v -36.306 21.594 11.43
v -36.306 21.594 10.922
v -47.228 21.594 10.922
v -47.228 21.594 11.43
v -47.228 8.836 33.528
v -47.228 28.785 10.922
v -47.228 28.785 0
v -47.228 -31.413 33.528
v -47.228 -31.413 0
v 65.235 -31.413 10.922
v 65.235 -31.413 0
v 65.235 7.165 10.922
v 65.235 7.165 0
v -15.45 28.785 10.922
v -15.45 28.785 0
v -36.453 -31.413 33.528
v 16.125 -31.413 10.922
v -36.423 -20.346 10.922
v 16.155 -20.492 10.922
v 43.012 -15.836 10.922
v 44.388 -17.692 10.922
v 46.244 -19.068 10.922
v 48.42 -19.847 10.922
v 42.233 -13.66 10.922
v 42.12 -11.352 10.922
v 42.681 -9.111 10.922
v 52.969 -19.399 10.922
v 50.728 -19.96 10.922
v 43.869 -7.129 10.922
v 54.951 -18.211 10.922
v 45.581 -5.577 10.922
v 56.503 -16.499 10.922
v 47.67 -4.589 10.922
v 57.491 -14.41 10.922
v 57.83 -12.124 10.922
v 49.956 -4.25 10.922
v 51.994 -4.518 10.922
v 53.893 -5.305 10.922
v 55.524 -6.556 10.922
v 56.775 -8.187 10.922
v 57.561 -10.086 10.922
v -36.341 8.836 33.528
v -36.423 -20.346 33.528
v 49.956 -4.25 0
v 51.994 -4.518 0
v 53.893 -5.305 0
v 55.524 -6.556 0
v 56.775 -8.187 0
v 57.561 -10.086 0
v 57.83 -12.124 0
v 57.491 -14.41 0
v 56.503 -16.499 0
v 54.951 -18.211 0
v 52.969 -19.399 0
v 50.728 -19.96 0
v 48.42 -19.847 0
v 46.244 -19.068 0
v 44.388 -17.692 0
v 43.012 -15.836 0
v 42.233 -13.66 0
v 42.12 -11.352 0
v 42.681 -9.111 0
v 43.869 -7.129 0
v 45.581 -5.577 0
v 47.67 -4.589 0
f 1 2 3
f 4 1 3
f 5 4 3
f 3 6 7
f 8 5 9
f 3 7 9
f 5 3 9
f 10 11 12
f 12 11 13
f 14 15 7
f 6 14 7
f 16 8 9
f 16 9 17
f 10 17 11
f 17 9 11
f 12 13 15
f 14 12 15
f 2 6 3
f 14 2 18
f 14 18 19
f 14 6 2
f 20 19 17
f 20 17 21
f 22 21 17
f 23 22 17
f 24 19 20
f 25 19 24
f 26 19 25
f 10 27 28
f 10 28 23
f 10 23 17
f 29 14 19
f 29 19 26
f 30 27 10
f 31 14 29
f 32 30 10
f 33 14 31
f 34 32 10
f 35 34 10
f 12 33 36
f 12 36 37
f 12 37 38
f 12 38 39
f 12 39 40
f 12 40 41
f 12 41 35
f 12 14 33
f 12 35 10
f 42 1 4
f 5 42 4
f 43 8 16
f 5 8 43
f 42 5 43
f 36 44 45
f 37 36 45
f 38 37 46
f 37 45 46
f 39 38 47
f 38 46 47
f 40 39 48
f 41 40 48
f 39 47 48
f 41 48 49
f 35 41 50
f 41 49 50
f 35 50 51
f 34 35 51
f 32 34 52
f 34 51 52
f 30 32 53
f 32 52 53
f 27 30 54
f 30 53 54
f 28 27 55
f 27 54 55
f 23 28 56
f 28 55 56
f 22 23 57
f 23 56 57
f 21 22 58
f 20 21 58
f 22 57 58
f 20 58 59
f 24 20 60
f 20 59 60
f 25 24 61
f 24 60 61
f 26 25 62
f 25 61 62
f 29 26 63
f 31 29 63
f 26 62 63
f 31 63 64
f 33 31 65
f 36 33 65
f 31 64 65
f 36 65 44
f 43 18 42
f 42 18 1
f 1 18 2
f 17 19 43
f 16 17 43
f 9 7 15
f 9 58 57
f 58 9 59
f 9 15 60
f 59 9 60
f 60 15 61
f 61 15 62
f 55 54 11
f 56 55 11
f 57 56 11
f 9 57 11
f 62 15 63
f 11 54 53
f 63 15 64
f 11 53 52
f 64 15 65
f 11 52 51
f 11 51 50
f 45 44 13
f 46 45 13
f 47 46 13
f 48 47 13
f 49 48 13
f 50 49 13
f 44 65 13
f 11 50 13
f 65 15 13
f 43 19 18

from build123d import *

# Parameters (mm, degrees)
F1_DEPTH   = 10.922
F2_DEPTH   = 33.528
F2_FACE1_W = 10.922
F2_FACE1_H = 22.606
F4_DEPTH   = 53.594
F5_SIZE2   = 12.7582862486
F5_SIZE    = 22.098


with BuildPart() as f1:
    # F0 (on Top) → F1 (new body)
    with BuildSketch(Plane.XY):
        Polygon((-15.4502129098, 28.784671135), (-47.2277541757, 28.784671135), (-47.2277541757, 21.5939618647), (-36.3057541757, 21.5939618647), (-36.4225804595, -20.345826518), (16.1552155546, -20.4922857339), (16.2997870902, -31.413328865), (65.234824773, -31.413328865), (65.234824773, 7.1651804467), align=None)
        with BuildLine():
            ThreePointArc((49.9557780186, -4.2500742092), (55.5235368137, -6.5563154141), (57.8297780186, -12.1240742092))
            ThreePointArc((57.8297780186, -12.1240742092), (44.3880192235, -17.6918330042), (49.9557780186, -4.2500742092))
        make_face(mode=Mode.SUBTRACT)
    extrude(amount=F1_DEPTH)

    # F0 (on Top) → F2 (join)
    with BuildSketch(Plane.XY):
        Polygon((-36.3057541757, 21.5939618647), (-47.2277541757, 21.5939618647), (-47.2277541757, -31.413328865), (-36.4534097798, -31.413328865), (-36.4225804595, -20.345826518), align=None)
        Polygon((-36.4225804595, -20.345826518), (-36.4534097798, -31.413328865), (-15.4502129098, -31.413328865), (16.2997870902, -31.413328865), (16.1552155546, -20.4922857339), align=None)
    extrude(amount=F2_DEPTH)

    # F3 (on face) + F2_face1 (on face) → F4 (cut)
    with BuildSketch(Plane(origin=(-0.0569569325, -20.4471255665, 0), x_dir=(-0.9999961203, 0.0027855608, 0), z_dir=(0.0027855608, 0.9999961203, 0))):
        Polygon((-16.2122353854, 10.922), (36.3657646146, 33.528), (-16.2122353854, 33.528), align=None)
    with BuildSketch(Plane(origin=(16.2275013224, -25.9528072994, 22.225), x_dir=(-0.0132367273, 0.9999123907, 0), z_dir=(0.9999123907, 0.0132367273, 0))):
        Rectangle(F2_FACE1_W, F2_FACE1_H)
    extrude(amount=-F4_DEPTH, dir=(0.0027855608, 0.9999961203, 0), mode=Mode.SUBTRACT)

    # F5
    f5_edges = [f1.edges().sort_by_distance(p)[0] for p in [
        (-41.766754, 21.593962, 33.528),
    ]]
    f5_side = f1.faces().sort_by_distance((-41.766754, 21.593962, 22.225))[0]
    chamfer(f5_edges, length=F5_SIZE, length2=F5_SIZE2, reference=f5_side)


solid = f1.part
